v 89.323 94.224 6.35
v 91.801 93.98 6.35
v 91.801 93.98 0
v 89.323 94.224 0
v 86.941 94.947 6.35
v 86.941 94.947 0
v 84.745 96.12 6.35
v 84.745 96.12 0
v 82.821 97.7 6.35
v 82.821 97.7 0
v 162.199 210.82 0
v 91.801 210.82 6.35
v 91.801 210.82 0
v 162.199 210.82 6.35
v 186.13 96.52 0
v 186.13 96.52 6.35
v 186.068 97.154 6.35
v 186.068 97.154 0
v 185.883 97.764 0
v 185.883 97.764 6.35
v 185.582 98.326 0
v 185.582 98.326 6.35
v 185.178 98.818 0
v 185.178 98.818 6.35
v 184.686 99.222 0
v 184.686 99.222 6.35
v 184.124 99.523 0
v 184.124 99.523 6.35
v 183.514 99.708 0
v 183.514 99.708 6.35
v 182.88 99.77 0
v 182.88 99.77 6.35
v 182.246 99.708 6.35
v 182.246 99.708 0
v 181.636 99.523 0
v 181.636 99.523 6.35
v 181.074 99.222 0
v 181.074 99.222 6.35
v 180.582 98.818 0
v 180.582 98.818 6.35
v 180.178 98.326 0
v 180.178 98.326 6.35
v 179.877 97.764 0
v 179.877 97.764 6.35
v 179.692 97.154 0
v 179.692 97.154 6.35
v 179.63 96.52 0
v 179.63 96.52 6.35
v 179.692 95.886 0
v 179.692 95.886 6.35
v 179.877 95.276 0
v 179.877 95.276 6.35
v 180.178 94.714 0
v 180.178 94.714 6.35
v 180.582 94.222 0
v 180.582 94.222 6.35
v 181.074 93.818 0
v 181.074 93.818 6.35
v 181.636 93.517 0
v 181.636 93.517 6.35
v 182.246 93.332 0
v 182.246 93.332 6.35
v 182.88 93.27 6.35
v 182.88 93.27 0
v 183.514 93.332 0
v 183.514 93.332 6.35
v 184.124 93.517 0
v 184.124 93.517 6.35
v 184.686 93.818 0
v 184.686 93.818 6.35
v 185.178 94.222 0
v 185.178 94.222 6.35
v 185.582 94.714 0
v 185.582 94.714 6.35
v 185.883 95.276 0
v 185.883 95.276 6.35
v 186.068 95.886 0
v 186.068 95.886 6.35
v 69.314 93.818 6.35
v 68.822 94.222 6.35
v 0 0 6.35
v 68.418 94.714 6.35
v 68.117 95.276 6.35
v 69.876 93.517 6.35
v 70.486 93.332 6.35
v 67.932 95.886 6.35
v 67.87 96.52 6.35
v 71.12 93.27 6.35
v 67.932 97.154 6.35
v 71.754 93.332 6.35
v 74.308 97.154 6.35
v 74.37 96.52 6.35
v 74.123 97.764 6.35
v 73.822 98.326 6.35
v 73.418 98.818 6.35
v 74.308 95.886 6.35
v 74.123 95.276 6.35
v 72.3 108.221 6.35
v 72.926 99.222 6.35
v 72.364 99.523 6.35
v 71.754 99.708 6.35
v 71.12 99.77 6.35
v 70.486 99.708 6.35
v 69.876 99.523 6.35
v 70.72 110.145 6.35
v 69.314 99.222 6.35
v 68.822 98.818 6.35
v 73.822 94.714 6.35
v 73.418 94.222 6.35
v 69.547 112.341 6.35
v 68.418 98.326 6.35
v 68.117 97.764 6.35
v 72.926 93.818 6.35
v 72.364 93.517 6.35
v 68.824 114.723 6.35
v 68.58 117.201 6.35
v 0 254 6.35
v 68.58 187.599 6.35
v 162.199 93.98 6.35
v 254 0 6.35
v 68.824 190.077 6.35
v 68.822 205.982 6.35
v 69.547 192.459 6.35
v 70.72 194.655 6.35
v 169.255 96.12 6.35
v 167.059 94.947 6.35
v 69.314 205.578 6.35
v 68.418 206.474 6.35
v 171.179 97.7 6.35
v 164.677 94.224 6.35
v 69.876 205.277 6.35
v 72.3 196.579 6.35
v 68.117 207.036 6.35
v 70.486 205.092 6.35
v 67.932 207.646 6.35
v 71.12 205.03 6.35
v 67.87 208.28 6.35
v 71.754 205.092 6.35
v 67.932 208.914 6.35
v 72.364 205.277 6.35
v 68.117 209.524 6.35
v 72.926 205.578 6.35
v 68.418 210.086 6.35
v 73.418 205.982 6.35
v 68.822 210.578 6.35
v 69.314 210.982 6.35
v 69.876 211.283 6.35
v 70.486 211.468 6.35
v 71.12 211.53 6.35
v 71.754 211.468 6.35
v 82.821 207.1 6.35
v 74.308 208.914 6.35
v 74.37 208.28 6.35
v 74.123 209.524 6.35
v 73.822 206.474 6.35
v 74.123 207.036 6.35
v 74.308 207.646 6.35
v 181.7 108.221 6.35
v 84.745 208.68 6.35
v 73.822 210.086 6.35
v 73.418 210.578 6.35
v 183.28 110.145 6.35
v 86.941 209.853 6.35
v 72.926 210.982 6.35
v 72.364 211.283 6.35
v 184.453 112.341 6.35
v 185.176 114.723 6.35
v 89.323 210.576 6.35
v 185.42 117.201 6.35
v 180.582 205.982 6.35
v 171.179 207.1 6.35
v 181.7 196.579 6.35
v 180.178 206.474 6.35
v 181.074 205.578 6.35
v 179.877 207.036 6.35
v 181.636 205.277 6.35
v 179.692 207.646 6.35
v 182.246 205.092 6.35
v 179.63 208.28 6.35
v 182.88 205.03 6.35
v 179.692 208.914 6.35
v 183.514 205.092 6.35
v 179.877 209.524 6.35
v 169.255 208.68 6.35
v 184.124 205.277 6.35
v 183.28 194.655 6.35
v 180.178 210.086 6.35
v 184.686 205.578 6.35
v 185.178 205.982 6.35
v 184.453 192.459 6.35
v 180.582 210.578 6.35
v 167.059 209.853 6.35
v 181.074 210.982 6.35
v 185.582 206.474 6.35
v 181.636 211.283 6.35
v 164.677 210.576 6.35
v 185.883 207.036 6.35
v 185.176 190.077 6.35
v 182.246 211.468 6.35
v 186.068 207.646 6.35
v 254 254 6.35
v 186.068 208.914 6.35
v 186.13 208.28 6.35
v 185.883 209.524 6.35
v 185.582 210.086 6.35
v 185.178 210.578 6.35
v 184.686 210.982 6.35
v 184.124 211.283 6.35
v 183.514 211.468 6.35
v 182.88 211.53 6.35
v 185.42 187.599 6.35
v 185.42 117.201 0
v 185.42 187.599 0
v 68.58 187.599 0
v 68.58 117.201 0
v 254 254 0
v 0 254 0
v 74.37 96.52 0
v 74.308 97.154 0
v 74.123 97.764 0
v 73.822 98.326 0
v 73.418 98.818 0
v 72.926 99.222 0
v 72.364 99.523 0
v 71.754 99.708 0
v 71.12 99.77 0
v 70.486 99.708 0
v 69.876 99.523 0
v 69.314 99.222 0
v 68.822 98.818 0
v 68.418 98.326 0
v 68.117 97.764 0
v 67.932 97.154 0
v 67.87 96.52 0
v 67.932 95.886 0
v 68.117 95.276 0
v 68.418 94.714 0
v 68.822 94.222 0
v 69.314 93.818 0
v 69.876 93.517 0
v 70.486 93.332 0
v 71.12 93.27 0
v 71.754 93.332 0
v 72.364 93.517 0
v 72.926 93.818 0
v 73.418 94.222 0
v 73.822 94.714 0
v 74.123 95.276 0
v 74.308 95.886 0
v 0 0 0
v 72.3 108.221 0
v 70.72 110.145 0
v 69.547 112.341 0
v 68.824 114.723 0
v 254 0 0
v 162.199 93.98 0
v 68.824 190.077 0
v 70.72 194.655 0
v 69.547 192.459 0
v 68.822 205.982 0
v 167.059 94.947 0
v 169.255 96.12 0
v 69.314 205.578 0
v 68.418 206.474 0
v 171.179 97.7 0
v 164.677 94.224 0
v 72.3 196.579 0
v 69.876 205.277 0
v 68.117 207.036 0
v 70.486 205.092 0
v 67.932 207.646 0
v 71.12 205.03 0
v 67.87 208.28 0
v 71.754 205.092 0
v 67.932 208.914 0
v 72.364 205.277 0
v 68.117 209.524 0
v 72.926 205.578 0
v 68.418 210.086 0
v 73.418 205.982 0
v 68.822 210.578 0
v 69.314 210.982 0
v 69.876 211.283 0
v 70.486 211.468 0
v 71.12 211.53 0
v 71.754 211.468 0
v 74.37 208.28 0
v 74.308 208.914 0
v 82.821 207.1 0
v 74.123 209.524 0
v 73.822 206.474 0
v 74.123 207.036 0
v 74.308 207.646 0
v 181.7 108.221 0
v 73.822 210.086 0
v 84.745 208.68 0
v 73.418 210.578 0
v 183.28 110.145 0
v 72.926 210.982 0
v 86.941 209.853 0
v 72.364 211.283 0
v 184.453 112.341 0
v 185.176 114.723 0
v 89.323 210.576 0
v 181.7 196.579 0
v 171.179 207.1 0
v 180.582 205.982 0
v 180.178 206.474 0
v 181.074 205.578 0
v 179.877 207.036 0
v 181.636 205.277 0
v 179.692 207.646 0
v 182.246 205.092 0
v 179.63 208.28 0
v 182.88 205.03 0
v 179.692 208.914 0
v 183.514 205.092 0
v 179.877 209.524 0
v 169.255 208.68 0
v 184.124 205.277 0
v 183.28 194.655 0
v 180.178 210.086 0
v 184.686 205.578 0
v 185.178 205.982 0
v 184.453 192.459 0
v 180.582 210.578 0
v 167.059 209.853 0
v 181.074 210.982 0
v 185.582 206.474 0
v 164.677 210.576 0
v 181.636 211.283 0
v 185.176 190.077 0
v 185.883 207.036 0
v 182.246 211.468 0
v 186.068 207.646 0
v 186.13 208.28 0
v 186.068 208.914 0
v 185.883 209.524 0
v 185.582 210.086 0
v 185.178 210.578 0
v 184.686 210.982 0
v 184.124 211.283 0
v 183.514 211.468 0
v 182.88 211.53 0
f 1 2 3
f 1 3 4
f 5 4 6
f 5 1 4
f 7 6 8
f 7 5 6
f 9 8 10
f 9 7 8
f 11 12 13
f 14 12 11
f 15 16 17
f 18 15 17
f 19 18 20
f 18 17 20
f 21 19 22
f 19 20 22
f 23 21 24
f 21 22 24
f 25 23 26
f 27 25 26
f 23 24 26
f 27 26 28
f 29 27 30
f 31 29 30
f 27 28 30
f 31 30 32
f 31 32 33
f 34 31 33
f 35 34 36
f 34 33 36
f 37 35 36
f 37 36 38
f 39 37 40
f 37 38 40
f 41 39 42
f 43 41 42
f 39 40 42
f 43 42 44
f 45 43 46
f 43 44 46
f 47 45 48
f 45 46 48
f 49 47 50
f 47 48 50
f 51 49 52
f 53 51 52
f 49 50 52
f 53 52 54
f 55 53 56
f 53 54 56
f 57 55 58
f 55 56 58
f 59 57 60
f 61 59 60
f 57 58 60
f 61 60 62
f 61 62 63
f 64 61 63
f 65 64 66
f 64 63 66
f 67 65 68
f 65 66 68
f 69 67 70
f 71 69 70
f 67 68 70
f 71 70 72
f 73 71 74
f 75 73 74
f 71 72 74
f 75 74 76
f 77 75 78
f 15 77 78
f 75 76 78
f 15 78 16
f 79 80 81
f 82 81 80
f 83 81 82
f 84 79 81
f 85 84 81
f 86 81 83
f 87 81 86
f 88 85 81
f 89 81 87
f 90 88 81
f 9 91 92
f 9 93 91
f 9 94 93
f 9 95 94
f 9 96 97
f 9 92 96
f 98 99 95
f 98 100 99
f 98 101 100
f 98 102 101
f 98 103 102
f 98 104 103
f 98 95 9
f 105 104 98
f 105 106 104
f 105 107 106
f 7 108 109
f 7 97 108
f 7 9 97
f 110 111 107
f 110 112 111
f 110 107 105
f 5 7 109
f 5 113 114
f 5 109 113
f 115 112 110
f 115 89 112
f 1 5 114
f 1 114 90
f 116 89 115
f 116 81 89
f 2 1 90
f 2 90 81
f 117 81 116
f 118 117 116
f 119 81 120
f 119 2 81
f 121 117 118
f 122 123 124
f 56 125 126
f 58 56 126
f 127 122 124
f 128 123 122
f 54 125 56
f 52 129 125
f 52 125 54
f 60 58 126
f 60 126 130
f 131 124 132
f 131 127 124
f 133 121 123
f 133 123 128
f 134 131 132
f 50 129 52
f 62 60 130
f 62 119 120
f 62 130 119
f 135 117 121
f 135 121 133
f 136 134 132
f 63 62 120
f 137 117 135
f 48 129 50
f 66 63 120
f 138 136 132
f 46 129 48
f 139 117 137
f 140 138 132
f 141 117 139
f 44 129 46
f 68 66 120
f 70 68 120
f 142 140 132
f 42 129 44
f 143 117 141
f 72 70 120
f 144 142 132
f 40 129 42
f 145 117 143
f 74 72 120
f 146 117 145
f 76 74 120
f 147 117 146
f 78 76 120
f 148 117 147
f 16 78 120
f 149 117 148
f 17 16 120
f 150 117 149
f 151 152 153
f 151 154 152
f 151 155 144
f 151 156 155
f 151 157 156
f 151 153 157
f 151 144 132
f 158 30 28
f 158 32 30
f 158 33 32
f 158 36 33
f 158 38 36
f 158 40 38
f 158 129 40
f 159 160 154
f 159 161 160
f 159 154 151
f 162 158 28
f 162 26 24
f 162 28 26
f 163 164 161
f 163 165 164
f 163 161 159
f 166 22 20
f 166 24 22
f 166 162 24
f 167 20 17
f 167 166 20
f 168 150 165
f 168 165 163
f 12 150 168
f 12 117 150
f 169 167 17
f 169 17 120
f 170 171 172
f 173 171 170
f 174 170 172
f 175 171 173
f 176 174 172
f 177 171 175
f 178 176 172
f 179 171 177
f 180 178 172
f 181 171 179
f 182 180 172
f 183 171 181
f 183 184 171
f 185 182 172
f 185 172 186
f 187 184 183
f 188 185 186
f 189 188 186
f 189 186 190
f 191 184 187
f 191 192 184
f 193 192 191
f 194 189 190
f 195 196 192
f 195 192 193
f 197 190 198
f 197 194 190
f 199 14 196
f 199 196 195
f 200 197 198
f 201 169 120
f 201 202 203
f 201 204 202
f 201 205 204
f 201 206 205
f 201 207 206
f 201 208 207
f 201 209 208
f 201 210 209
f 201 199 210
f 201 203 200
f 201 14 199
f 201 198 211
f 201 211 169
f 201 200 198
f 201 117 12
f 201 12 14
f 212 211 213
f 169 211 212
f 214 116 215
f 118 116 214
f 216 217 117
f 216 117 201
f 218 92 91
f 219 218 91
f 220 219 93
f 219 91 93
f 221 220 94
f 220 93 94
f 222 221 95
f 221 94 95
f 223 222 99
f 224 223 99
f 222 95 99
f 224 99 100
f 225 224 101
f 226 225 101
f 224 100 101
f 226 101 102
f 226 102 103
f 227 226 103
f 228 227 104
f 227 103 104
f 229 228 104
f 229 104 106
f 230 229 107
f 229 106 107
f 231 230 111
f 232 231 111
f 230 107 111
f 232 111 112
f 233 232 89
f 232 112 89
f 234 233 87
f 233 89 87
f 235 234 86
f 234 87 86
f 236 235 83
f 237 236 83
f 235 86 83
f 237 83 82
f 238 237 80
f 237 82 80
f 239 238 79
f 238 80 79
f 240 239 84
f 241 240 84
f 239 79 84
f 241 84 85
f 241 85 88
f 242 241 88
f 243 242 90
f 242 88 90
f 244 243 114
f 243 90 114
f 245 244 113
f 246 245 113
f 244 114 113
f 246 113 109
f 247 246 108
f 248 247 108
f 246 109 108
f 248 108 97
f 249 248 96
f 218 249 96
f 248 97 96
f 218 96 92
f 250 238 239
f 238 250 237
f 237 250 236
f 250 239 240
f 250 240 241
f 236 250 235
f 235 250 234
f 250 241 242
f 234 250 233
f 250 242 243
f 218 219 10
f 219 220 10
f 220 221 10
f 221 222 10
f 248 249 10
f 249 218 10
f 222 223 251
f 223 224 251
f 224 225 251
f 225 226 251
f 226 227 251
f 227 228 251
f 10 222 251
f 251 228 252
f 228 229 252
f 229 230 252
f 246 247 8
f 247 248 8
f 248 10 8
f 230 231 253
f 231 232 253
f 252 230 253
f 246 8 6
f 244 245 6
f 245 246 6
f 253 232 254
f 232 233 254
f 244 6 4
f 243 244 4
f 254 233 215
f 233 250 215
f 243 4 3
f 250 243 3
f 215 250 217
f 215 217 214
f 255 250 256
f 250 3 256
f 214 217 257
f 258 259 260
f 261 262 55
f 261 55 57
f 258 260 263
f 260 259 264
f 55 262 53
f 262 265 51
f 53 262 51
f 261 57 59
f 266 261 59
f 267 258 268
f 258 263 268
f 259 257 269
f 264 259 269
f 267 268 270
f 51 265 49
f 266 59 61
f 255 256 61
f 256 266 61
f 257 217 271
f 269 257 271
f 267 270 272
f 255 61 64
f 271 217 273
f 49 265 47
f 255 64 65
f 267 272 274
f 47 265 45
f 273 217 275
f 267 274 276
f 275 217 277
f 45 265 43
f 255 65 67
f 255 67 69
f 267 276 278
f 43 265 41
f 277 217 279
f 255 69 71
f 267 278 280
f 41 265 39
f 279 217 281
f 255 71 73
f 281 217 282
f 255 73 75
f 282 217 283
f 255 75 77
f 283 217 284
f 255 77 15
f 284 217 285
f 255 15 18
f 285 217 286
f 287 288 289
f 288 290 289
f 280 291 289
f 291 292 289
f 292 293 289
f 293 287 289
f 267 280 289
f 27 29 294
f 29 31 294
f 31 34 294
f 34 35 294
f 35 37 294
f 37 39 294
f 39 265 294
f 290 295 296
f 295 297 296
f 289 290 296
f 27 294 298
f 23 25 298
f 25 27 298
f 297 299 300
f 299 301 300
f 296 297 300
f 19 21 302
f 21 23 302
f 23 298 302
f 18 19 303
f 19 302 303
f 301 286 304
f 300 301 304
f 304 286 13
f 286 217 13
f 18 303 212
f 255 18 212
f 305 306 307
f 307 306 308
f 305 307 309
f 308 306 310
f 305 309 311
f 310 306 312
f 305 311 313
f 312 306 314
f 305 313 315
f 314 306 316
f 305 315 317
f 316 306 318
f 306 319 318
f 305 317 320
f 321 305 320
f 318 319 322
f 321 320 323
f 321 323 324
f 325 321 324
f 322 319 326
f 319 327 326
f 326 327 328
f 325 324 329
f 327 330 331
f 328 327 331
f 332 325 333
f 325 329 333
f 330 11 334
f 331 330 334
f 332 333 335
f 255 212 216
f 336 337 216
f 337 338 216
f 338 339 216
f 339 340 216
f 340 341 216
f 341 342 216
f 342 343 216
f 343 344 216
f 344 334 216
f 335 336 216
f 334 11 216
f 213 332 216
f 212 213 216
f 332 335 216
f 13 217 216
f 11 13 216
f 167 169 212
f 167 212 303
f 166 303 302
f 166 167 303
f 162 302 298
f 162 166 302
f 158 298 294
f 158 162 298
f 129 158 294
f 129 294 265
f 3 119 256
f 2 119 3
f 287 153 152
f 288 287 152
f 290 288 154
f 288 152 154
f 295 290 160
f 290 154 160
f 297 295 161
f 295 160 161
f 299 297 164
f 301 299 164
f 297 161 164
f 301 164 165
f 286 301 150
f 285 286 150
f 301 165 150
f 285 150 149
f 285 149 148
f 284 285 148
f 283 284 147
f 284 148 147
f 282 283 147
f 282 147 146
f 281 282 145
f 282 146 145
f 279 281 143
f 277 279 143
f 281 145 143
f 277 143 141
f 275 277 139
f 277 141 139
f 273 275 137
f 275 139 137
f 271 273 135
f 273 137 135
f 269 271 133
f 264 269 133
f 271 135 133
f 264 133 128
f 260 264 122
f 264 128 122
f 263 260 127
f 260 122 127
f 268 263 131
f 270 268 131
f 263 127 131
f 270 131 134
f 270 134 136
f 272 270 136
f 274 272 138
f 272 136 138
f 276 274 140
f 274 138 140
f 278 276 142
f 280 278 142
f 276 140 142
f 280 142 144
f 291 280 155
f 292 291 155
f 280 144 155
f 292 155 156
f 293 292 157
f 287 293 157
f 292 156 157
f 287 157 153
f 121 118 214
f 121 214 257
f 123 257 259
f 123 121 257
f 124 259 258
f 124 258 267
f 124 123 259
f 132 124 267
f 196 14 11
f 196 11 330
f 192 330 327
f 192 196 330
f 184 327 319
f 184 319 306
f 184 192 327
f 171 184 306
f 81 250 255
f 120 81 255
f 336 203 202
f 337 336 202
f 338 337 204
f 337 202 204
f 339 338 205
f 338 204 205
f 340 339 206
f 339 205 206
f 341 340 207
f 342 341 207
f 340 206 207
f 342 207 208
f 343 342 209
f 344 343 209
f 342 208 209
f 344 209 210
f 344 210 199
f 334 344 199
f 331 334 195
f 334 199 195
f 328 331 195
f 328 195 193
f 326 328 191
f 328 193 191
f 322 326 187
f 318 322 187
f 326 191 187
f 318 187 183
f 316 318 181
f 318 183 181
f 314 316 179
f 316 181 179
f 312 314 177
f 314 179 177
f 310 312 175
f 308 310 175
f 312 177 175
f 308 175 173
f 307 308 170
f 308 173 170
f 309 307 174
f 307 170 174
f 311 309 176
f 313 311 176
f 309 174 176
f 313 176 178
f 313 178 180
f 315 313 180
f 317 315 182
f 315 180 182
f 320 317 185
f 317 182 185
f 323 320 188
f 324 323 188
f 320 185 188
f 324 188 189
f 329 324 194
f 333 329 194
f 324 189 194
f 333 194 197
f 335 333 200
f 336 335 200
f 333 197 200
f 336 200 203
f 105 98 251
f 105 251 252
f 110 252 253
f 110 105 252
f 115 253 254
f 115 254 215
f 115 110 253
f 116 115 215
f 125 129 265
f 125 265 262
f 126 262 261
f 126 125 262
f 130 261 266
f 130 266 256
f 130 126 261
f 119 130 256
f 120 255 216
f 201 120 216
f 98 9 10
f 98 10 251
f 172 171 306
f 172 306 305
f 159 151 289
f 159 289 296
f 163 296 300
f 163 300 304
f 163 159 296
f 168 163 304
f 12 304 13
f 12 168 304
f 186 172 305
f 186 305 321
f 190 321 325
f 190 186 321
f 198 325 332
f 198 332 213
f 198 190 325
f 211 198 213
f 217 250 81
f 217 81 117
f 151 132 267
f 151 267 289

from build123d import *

# Parameters (mm, degrees)
SKETCH2_W           = 254
SKETCH2_H           = 254
BOSS_EXTRUDE1_DEPTH = 6.35
SKETCH3_R           = 3.25
CUT_EXTRUDE1_DEPTH  = 6.35


with BuildPart() as part:
    # Sketch2 → Boss-Extrude1 (new body)
    with BuildSketch(Plane.XY):
        with Locations((127, 127)):
            Rectangle(SKETCH2_W, SKETCH2_H)
    extrude(amount=BOSS_EXTRUDE1_DEPTH)

    # Sketch3 → Cut-Extrude1 (cut)
    with BuildSketch(Plane.XY.offset(6.35)):
        with Locations((71.12, 208.28)):
            Circle(SKETCH3_R)
        with Locations((182.88, 208.28)):
            Circle(SKETCH3_R)
        with Locations((182.88, 96.52)):
            Circle(SKETCH3_R)
        with Locations((71.12, 96.52)):
            Circle(SKETCH3_R)
        with BuildLine():
            Line((72.299743879, 196.579231637), (82.820768363, 207.100256121))
            ThreePointArc((82.820768363, 207.100256121), (86.940944893, 209.853270063), (91.801024484, 210.82))
            Line((91.801024484, 210.82), (162.198975516, 210.82))
            ThreePointArc((162.198975516, 210.82), (167.059055107, 209.853270063), (171.179231637, 207.100256121))
            Line((171.179231637, 207.100256121), (181.700256121, 196.579231637))
            ThreePointArc((181.700256121, 196.579231637), (184.453270063, 192.459055107), (185.42, 187.598975516))
            Line((185.42, 187.598975516), (185.42, 117.201024484))
            ThreePointArc((185.42, 117.201024484), (184.453270063, 112.340944893), (181.700256121, 108.220768363))
            Line((181.700256121, 108.220768363), (171.179231637, 97.699743879))
            ThreePointArc((171.179231637, 97.699743879), (167.059055107, 94.946729937), (162.198975516, 93.98))
            Line((162.198975516, 93.98), (91.801024484, 93.98))
            ThreePointArc((91.801024484, 93.98), (86.940944893, 94.946729937), (82.820768363, 97.699743879))
            Line((82.820768363, 97.699743879), (72.299743879, 108.220768363))
            ThreePointArc((72.299743879, 108.220768363), (69.546729937, 112.340944893), (68.58, 117.201024484))
            Line((68.58, 117.201024484), (68.58, 187.598975516))
            ThreePointArc((68.58, 187.598975516), (69.546729937, 192.459055107), (72.299743879, 196.579231637))
        make_face()
    extrude(amount=-CUT_EXTRUDE1_DEPTH, mode=Mode.SUBTRACT)


solid = part.part
